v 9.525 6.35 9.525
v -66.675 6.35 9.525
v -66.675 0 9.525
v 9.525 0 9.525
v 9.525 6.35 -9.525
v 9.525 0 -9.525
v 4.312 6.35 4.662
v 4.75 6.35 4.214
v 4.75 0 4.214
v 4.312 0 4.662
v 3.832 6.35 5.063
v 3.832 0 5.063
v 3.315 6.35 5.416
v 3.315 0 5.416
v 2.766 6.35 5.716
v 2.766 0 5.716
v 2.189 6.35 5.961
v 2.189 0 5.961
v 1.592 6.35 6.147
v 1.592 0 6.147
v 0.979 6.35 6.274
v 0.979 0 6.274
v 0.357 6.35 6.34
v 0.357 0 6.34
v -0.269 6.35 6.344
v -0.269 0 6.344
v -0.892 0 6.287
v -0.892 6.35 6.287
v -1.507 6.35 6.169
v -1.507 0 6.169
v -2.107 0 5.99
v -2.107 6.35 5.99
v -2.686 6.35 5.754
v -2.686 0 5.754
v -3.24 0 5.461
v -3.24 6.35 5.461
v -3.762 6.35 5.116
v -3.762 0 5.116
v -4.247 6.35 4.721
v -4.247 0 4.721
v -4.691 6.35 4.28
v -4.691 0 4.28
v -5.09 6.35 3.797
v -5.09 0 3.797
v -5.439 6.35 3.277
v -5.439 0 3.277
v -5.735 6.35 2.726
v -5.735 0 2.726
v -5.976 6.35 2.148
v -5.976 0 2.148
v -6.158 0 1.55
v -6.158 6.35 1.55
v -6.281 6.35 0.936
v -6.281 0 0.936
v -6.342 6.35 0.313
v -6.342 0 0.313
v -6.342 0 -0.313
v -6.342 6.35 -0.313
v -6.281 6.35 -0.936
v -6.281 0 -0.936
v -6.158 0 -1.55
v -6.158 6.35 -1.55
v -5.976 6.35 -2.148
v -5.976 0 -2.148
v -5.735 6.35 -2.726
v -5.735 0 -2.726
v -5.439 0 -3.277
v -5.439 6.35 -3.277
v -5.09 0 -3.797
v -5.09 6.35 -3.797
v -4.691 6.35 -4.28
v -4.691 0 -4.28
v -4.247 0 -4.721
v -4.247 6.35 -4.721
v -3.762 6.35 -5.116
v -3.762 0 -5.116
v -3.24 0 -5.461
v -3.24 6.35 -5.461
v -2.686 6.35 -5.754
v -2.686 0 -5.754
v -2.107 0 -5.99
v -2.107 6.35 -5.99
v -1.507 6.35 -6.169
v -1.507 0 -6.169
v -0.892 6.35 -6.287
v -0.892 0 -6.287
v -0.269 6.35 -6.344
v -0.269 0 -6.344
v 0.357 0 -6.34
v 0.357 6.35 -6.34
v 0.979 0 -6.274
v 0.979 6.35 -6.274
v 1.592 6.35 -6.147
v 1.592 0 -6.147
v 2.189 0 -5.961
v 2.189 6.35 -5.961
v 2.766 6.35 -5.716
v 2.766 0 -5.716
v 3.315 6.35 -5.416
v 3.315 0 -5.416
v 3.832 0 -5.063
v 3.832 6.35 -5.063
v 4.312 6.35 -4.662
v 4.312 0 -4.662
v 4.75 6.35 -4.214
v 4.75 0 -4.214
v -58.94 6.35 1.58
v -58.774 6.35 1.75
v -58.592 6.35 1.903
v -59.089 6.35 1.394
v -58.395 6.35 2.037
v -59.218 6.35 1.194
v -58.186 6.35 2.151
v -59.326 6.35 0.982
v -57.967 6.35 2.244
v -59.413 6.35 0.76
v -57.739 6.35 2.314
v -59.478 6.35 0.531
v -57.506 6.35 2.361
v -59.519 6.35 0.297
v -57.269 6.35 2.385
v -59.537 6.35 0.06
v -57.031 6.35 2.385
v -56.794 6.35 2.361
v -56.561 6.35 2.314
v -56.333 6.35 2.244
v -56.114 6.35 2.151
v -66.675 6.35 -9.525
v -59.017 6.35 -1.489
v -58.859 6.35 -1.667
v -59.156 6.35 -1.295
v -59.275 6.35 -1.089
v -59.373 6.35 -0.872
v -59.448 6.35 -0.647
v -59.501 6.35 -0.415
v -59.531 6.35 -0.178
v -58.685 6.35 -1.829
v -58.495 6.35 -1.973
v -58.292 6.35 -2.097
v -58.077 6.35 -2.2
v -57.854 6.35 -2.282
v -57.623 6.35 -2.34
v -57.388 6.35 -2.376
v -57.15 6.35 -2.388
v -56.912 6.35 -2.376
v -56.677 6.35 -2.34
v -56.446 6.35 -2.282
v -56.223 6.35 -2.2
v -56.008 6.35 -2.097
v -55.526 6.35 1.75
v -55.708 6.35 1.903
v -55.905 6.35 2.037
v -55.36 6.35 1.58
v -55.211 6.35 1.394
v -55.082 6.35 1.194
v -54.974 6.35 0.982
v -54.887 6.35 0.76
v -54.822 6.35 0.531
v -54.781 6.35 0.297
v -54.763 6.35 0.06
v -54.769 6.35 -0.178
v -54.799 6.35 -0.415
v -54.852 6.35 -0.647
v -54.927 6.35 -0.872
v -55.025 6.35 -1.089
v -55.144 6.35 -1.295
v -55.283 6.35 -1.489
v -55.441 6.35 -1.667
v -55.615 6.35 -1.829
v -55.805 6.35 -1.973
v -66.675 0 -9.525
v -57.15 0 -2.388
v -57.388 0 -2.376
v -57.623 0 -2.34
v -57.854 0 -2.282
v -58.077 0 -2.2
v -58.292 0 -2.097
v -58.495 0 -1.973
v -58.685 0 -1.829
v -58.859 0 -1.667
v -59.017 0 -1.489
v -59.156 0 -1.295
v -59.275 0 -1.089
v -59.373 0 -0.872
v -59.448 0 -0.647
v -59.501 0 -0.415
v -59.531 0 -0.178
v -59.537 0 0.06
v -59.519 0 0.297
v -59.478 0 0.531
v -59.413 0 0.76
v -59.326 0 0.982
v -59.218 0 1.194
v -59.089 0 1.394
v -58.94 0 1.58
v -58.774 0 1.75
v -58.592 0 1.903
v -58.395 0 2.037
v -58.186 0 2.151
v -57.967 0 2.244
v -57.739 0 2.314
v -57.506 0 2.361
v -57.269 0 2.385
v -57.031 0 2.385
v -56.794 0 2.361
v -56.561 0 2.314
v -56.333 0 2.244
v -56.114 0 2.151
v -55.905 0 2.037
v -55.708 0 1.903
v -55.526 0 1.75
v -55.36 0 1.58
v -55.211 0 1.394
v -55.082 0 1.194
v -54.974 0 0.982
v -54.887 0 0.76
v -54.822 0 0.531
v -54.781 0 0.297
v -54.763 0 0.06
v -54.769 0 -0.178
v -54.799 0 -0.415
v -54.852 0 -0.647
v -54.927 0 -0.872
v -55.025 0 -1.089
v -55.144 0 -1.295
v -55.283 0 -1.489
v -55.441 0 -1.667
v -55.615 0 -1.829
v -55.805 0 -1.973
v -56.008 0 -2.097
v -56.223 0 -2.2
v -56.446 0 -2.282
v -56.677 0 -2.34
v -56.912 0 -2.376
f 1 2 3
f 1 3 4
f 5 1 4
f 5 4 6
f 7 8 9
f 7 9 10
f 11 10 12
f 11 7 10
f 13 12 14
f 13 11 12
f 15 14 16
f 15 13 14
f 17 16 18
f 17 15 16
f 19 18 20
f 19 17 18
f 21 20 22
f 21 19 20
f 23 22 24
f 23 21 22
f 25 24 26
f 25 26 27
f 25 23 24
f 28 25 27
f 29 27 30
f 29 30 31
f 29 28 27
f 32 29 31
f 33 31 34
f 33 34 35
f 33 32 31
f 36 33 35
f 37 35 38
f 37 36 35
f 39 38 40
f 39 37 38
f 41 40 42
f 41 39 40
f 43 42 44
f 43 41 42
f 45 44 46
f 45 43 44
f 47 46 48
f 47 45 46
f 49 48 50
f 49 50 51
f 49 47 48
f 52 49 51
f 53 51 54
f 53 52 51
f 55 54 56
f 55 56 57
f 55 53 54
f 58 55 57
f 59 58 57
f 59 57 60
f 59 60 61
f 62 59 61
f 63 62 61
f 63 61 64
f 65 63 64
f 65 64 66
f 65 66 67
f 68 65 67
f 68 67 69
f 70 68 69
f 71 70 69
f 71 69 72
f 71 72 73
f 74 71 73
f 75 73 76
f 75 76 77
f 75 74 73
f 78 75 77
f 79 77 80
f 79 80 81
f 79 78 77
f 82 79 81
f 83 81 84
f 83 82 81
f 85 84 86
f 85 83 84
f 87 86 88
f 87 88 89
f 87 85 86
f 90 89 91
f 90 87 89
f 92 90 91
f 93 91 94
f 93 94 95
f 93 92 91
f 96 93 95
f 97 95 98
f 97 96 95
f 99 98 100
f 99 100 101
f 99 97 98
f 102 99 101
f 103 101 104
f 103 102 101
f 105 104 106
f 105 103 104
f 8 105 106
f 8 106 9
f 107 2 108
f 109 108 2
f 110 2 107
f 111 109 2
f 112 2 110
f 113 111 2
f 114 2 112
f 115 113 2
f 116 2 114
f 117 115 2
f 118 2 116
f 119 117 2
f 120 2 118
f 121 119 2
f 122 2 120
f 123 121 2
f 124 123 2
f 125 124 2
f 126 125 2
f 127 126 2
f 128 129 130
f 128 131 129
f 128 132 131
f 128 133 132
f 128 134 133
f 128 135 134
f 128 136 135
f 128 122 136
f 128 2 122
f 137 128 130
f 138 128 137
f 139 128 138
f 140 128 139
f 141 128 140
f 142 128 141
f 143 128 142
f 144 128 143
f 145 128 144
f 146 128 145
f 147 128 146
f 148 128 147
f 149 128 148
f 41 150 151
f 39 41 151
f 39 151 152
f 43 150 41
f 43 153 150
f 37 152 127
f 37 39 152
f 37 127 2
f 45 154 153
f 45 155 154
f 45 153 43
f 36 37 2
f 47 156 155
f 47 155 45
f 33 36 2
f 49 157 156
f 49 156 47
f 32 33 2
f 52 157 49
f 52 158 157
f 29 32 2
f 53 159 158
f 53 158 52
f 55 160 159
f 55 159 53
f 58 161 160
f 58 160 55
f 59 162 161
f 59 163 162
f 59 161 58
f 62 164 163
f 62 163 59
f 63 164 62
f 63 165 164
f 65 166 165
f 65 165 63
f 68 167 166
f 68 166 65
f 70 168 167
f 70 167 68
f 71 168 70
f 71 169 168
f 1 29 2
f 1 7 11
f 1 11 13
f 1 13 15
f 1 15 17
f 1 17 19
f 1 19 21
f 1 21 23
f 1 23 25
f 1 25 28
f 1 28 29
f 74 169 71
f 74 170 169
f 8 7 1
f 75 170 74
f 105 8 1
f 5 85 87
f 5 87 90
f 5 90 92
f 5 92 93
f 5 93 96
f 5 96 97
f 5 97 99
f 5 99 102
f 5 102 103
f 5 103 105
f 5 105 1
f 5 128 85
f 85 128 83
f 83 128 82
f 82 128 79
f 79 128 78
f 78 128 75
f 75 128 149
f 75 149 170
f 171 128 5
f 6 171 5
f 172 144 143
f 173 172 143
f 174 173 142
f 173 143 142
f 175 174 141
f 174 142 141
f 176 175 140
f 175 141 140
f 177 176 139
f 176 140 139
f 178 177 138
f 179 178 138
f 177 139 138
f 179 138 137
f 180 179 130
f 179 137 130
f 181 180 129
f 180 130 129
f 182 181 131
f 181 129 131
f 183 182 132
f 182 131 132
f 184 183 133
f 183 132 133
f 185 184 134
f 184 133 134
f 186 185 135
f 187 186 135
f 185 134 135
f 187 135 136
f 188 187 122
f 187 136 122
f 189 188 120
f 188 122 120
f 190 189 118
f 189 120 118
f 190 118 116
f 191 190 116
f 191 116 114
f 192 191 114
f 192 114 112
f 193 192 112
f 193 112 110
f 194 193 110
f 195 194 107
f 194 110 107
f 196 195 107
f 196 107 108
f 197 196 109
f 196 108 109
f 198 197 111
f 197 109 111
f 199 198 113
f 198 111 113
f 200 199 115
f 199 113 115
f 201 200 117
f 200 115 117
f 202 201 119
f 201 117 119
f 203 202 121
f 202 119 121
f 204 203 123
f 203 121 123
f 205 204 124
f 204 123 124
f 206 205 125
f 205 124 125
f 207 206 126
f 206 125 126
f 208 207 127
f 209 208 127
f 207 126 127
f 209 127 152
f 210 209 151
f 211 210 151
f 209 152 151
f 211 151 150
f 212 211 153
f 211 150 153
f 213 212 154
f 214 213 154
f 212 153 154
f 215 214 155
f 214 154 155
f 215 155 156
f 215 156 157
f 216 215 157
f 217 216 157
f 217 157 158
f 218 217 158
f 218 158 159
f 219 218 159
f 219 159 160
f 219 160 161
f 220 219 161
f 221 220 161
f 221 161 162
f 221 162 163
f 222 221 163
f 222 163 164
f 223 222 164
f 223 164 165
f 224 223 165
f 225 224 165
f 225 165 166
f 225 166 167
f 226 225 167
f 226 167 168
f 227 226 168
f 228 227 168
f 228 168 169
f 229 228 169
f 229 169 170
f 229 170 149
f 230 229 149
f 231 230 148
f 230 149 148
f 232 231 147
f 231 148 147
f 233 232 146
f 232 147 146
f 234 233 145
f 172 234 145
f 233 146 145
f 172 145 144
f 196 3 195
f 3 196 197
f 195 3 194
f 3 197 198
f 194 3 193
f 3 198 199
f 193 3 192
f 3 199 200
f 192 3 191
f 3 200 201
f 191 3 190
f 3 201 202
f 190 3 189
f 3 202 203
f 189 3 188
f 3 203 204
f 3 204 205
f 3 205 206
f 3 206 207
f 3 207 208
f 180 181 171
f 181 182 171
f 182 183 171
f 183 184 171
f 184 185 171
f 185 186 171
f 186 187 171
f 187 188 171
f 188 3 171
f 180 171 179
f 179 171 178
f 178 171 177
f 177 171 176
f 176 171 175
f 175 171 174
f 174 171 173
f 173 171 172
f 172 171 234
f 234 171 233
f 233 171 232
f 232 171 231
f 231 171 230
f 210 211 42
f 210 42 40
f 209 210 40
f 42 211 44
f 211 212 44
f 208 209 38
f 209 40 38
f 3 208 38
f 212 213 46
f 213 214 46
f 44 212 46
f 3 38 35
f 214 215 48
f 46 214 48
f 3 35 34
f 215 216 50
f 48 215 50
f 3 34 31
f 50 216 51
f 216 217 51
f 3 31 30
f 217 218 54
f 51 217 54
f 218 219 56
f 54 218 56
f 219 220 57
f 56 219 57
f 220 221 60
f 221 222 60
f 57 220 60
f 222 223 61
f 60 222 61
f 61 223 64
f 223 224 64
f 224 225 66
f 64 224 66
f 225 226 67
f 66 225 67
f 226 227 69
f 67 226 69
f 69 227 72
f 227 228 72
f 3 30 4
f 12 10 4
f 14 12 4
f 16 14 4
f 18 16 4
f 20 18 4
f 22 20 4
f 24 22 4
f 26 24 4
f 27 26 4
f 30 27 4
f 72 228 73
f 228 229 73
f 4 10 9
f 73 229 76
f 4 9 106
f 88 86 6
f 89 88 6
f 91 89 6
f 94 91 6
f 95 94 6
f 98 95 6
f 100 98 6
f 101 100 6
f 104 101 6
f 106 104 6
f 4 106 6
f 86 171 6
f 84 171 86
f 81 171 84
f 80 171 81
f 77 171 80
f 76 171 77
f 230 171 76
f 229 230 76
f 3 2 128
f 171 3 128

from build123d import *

# Parameters (mm, degrees)
SKETCH_1_W      = 76.2
SKETCH_1_H      = 19.05
SKETCH_1_R      = 2.3876
EXTRUDE_1_DEPTH = 6.35


with BuildPart() as part:
    # 스케치1 → 보스-돌출1 (new body)
    with BuildSketch(Plane(origin=(0, 6.35, 0), x_dir=(1, 0, 0), z_dir=(0, 1, 0))):
        with Locations((-28.575, 0)):
            Rectangle(SKETCH_1_W, SKETCH_1_H)
        with Locations(Location((-57.15, 0, 0), (0, 0, 90))):
            Circle(SKETCH_1_R, mode=Mode.SUBTRACT)
        with BuildLine():
            Line((4.7498, 4.214486915), (4.7498, -4.214486915))
            ThreePointArc((4.7498, -4.214486915), (-6.35, 0), (4.7498, 4.214486915))
        make_face(mode=Mode.SUBTRACT)
    extrude(amount=-EXTRUDE_1_DEPTH)


solid = part.part
